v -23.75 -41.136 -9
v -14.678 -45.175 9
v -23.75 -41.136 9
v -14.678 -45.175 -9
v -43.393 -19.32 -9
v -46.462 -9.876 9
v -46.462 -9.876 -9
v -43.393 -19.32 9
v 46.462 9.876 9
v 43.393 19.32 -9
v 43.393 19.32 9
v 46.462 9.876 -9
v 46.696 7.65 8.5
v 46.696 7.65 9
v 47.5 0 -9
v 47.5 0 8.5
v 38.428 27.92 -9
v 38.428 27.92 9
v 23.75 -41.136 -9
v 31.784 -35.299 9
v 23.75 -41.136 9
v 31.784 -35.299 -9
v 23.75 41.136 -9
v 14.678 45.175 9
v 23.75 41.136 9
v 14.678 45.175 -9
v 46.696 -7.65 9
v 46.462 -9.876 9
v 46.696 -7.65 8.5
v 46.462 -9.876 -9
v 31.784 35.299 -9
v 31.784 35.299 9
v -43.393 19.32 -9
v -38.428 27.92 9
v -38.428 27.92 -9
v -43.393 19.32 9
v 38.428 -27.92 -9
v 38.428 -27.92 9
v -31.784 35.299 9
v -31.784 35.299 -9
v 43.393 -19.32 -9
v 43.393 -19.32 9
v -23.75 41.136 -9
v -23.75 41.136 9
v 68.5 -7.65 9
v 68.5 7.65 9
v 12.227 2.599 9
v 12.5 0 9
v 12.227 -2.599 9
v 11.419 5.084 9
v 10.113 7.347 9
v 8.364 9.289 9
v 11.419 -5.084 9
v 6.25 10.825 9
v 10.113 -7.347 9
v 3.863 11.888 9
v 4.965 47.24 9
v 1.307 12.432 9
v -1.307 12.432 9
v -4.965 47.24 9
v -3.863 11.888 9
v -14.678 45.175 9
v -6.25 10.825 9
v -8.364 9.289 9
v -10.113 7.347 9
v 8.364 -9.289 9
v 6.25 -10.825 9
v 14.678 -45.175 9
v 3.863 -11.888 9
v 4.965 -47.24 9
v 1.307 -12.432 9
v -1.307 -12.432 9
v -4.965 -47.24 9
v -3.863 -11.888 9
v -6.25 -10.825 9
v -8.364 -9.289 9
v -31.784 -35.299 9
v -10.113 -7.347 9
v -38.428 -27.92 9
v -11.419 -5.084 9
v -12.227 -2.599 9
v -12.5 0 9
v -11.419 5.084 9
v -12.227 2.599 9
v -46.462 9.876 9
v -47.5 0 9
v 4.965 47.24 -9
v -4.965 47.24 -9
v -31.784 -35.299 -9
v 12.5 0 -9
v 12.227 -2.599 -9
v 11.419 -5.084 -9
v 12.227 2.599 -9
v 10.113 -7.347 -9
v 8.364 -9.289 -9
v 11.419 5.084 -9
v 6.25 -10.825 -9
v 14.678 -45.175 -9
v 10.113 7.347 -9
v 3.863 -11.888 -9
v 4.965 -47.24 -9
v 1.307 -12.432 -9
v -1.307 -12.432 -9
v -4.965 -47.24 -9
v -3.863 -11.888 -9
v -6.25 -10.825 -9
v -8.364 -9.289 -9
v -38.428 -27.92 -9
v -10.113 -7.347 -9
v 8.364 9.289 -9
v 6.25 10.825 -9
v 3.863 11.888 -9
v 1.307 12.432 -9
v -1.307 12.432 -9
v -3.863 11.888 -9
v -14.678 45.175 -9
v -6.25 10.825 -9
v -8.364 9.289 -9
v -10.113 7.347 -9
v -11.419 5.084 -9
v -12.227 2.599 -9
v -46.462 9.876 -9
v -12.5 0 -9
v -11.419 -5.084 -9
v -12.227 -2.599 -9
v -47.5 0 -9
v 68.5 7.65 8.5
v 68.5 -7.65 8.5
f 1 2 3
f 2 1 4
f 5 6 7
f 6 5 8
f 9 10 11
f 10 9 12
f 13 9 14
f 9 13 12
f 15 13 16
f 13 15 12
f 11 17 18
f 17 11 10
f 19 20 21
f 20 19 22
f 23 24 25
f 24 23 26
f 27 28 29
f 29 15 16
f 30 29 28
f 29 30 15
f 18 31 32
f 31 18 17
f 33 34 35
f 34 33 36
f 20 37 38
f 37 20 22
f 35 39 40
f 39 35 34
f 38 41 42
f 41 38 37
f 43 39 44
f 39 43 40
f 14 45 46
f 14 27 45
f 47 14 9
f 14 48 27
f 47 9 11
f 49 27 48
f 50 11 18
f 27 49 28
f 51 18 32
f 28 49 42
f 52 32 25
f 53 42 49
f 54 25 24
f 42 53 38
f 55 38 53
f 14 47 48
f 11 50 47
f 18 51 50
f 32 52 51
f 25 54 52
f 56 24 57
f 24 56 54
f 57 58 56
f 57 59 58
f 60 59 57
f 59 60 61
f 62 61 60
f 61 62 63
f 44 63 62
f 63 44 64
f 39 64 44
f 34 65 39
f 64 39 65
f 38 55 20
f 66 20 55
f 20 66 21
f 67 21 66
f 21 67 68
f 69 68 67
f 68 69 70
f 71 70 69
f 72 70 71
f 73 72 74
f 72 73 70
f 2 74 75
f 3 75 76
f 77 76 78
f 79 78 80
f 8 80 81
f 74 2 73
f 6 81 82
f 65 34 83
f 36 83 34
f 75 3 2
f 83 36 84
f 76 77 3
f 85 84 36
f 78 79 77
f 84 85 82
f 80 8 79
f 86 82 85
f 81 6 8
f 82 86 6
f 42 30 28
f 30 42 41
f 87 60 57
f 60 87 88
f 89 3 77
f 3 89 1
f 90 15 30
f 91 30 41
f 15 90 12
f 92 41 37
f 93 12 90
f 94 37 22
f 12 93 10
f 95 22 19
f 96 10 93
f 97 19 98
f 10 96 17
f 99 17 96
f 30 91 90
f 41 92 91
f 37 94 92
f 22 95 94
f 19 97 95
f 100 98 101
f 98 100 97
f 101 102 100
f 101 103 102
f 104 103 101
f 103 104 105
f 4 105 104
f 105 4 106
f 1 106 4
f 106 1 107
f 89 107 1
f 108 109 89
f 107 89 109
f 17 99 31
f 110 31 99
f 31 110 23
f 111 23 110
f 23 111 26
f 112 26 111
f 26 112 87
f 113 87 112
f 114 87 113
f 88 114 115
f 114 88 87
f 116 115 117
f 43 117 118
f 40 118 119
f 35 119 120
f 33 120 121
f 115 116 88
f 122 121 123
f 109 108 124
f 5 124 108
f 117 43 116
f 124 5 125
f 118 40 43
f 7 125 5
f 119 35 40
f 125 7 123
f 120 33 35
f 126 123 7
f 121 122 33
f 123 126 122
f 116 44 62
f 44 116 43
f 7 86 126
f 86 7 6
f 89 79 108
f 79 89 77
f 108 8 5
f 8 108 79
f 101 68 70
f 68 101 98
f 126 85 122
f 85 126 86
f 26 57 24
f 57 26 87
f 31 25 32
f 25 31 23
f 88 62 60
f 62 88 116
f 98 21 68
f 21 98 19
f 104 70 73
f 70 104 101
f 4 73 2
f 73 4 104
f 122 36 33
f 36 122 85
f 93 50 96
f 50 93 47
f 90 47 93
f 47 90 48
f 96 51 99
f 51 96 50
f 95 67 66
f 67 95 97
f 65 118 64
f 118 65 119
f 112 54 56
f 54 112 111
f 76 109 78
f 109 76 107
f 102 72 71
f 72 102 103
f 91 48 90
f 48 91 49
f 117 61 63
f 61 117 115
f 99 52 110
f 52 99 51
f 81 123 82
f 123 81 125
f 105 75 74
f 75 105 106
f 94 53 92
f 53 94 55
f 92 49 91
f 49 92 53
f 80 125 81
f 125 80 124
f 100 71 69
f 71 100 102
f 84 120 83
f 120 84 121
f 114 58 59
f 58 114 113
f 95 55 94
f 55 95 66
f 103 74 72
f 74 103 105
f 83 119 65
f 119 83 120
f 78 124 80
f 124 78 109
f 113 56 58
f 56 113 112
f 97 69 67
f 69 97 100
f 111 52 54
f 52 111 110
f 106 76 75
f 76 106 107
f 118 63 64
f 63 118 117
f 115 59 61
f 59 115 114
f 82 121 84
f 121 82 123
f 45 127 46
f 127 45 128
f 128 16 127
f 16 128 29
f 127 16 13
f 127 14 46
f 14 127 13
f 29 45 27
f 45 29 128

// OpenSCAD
// Parameters
outer_diameter = 95; //[50:190:1]
inner_diameter = 25; //[12.5:50:1]
roll_width = 18; //[9:36:1]
tape_thickness = 0.05; //[0.02:0.2:0.01]
core_wall_thickness = 2; //[1:4:0.5]
overlap = 1; //[0.5:2:0.5]
flap_length = 22; //[10:44:1]
flap_width_factor = 0.85; //[0.5:1:0.05]

// Base Shapes
module tape_roll_body() {
  cylinder(r=outer_diameter/2, h=roll_width, center=true);
}

module inner_core_hole() {
  cylinder(r=inner_diameter/2, h=roll_width + 2*overlap, center=true);
}

module cardboard_core_outer() {
  cylinder(r=inner_diameter/2 + core_wall_thickness, h=roll_width, center=true);
}

module cardboard_core_inner_void() {
  cylinder(r=inner_diameter/2, h=roll_width + 2*overlap, center=true);
}

module tape_end_flap() {
  translate([outer_diameter/2 + flap_length/2 - overlap, 0, roll_width/2 - max(tape_thickness, 0.5)/2])
    cube([flap_length, roll_width*flap_width_factor, max(tape_thickness, 0.5)], center=true);
}

// Operations
module tape_band_thickness() {
  difference() {
    tape_roll_body();
    inner_core_hole();
  }
}

module cardboard_core_insert() {
  difference() {
    cardboard_core_outer();
    cardboard_core_inner_void();
  }
}

module outer_edge_faces() {
  union() {
    tape_band_thickness();
    cardboard_core_insert();
  }
}

module tape_roll_complete() {
  union() {
    outer_edge_faces();
    tape_end_flap();
  }
}

// Final Output
color([0.85, 0.85, 0.8]) // Off-white for tape
tape_roll_complete();
